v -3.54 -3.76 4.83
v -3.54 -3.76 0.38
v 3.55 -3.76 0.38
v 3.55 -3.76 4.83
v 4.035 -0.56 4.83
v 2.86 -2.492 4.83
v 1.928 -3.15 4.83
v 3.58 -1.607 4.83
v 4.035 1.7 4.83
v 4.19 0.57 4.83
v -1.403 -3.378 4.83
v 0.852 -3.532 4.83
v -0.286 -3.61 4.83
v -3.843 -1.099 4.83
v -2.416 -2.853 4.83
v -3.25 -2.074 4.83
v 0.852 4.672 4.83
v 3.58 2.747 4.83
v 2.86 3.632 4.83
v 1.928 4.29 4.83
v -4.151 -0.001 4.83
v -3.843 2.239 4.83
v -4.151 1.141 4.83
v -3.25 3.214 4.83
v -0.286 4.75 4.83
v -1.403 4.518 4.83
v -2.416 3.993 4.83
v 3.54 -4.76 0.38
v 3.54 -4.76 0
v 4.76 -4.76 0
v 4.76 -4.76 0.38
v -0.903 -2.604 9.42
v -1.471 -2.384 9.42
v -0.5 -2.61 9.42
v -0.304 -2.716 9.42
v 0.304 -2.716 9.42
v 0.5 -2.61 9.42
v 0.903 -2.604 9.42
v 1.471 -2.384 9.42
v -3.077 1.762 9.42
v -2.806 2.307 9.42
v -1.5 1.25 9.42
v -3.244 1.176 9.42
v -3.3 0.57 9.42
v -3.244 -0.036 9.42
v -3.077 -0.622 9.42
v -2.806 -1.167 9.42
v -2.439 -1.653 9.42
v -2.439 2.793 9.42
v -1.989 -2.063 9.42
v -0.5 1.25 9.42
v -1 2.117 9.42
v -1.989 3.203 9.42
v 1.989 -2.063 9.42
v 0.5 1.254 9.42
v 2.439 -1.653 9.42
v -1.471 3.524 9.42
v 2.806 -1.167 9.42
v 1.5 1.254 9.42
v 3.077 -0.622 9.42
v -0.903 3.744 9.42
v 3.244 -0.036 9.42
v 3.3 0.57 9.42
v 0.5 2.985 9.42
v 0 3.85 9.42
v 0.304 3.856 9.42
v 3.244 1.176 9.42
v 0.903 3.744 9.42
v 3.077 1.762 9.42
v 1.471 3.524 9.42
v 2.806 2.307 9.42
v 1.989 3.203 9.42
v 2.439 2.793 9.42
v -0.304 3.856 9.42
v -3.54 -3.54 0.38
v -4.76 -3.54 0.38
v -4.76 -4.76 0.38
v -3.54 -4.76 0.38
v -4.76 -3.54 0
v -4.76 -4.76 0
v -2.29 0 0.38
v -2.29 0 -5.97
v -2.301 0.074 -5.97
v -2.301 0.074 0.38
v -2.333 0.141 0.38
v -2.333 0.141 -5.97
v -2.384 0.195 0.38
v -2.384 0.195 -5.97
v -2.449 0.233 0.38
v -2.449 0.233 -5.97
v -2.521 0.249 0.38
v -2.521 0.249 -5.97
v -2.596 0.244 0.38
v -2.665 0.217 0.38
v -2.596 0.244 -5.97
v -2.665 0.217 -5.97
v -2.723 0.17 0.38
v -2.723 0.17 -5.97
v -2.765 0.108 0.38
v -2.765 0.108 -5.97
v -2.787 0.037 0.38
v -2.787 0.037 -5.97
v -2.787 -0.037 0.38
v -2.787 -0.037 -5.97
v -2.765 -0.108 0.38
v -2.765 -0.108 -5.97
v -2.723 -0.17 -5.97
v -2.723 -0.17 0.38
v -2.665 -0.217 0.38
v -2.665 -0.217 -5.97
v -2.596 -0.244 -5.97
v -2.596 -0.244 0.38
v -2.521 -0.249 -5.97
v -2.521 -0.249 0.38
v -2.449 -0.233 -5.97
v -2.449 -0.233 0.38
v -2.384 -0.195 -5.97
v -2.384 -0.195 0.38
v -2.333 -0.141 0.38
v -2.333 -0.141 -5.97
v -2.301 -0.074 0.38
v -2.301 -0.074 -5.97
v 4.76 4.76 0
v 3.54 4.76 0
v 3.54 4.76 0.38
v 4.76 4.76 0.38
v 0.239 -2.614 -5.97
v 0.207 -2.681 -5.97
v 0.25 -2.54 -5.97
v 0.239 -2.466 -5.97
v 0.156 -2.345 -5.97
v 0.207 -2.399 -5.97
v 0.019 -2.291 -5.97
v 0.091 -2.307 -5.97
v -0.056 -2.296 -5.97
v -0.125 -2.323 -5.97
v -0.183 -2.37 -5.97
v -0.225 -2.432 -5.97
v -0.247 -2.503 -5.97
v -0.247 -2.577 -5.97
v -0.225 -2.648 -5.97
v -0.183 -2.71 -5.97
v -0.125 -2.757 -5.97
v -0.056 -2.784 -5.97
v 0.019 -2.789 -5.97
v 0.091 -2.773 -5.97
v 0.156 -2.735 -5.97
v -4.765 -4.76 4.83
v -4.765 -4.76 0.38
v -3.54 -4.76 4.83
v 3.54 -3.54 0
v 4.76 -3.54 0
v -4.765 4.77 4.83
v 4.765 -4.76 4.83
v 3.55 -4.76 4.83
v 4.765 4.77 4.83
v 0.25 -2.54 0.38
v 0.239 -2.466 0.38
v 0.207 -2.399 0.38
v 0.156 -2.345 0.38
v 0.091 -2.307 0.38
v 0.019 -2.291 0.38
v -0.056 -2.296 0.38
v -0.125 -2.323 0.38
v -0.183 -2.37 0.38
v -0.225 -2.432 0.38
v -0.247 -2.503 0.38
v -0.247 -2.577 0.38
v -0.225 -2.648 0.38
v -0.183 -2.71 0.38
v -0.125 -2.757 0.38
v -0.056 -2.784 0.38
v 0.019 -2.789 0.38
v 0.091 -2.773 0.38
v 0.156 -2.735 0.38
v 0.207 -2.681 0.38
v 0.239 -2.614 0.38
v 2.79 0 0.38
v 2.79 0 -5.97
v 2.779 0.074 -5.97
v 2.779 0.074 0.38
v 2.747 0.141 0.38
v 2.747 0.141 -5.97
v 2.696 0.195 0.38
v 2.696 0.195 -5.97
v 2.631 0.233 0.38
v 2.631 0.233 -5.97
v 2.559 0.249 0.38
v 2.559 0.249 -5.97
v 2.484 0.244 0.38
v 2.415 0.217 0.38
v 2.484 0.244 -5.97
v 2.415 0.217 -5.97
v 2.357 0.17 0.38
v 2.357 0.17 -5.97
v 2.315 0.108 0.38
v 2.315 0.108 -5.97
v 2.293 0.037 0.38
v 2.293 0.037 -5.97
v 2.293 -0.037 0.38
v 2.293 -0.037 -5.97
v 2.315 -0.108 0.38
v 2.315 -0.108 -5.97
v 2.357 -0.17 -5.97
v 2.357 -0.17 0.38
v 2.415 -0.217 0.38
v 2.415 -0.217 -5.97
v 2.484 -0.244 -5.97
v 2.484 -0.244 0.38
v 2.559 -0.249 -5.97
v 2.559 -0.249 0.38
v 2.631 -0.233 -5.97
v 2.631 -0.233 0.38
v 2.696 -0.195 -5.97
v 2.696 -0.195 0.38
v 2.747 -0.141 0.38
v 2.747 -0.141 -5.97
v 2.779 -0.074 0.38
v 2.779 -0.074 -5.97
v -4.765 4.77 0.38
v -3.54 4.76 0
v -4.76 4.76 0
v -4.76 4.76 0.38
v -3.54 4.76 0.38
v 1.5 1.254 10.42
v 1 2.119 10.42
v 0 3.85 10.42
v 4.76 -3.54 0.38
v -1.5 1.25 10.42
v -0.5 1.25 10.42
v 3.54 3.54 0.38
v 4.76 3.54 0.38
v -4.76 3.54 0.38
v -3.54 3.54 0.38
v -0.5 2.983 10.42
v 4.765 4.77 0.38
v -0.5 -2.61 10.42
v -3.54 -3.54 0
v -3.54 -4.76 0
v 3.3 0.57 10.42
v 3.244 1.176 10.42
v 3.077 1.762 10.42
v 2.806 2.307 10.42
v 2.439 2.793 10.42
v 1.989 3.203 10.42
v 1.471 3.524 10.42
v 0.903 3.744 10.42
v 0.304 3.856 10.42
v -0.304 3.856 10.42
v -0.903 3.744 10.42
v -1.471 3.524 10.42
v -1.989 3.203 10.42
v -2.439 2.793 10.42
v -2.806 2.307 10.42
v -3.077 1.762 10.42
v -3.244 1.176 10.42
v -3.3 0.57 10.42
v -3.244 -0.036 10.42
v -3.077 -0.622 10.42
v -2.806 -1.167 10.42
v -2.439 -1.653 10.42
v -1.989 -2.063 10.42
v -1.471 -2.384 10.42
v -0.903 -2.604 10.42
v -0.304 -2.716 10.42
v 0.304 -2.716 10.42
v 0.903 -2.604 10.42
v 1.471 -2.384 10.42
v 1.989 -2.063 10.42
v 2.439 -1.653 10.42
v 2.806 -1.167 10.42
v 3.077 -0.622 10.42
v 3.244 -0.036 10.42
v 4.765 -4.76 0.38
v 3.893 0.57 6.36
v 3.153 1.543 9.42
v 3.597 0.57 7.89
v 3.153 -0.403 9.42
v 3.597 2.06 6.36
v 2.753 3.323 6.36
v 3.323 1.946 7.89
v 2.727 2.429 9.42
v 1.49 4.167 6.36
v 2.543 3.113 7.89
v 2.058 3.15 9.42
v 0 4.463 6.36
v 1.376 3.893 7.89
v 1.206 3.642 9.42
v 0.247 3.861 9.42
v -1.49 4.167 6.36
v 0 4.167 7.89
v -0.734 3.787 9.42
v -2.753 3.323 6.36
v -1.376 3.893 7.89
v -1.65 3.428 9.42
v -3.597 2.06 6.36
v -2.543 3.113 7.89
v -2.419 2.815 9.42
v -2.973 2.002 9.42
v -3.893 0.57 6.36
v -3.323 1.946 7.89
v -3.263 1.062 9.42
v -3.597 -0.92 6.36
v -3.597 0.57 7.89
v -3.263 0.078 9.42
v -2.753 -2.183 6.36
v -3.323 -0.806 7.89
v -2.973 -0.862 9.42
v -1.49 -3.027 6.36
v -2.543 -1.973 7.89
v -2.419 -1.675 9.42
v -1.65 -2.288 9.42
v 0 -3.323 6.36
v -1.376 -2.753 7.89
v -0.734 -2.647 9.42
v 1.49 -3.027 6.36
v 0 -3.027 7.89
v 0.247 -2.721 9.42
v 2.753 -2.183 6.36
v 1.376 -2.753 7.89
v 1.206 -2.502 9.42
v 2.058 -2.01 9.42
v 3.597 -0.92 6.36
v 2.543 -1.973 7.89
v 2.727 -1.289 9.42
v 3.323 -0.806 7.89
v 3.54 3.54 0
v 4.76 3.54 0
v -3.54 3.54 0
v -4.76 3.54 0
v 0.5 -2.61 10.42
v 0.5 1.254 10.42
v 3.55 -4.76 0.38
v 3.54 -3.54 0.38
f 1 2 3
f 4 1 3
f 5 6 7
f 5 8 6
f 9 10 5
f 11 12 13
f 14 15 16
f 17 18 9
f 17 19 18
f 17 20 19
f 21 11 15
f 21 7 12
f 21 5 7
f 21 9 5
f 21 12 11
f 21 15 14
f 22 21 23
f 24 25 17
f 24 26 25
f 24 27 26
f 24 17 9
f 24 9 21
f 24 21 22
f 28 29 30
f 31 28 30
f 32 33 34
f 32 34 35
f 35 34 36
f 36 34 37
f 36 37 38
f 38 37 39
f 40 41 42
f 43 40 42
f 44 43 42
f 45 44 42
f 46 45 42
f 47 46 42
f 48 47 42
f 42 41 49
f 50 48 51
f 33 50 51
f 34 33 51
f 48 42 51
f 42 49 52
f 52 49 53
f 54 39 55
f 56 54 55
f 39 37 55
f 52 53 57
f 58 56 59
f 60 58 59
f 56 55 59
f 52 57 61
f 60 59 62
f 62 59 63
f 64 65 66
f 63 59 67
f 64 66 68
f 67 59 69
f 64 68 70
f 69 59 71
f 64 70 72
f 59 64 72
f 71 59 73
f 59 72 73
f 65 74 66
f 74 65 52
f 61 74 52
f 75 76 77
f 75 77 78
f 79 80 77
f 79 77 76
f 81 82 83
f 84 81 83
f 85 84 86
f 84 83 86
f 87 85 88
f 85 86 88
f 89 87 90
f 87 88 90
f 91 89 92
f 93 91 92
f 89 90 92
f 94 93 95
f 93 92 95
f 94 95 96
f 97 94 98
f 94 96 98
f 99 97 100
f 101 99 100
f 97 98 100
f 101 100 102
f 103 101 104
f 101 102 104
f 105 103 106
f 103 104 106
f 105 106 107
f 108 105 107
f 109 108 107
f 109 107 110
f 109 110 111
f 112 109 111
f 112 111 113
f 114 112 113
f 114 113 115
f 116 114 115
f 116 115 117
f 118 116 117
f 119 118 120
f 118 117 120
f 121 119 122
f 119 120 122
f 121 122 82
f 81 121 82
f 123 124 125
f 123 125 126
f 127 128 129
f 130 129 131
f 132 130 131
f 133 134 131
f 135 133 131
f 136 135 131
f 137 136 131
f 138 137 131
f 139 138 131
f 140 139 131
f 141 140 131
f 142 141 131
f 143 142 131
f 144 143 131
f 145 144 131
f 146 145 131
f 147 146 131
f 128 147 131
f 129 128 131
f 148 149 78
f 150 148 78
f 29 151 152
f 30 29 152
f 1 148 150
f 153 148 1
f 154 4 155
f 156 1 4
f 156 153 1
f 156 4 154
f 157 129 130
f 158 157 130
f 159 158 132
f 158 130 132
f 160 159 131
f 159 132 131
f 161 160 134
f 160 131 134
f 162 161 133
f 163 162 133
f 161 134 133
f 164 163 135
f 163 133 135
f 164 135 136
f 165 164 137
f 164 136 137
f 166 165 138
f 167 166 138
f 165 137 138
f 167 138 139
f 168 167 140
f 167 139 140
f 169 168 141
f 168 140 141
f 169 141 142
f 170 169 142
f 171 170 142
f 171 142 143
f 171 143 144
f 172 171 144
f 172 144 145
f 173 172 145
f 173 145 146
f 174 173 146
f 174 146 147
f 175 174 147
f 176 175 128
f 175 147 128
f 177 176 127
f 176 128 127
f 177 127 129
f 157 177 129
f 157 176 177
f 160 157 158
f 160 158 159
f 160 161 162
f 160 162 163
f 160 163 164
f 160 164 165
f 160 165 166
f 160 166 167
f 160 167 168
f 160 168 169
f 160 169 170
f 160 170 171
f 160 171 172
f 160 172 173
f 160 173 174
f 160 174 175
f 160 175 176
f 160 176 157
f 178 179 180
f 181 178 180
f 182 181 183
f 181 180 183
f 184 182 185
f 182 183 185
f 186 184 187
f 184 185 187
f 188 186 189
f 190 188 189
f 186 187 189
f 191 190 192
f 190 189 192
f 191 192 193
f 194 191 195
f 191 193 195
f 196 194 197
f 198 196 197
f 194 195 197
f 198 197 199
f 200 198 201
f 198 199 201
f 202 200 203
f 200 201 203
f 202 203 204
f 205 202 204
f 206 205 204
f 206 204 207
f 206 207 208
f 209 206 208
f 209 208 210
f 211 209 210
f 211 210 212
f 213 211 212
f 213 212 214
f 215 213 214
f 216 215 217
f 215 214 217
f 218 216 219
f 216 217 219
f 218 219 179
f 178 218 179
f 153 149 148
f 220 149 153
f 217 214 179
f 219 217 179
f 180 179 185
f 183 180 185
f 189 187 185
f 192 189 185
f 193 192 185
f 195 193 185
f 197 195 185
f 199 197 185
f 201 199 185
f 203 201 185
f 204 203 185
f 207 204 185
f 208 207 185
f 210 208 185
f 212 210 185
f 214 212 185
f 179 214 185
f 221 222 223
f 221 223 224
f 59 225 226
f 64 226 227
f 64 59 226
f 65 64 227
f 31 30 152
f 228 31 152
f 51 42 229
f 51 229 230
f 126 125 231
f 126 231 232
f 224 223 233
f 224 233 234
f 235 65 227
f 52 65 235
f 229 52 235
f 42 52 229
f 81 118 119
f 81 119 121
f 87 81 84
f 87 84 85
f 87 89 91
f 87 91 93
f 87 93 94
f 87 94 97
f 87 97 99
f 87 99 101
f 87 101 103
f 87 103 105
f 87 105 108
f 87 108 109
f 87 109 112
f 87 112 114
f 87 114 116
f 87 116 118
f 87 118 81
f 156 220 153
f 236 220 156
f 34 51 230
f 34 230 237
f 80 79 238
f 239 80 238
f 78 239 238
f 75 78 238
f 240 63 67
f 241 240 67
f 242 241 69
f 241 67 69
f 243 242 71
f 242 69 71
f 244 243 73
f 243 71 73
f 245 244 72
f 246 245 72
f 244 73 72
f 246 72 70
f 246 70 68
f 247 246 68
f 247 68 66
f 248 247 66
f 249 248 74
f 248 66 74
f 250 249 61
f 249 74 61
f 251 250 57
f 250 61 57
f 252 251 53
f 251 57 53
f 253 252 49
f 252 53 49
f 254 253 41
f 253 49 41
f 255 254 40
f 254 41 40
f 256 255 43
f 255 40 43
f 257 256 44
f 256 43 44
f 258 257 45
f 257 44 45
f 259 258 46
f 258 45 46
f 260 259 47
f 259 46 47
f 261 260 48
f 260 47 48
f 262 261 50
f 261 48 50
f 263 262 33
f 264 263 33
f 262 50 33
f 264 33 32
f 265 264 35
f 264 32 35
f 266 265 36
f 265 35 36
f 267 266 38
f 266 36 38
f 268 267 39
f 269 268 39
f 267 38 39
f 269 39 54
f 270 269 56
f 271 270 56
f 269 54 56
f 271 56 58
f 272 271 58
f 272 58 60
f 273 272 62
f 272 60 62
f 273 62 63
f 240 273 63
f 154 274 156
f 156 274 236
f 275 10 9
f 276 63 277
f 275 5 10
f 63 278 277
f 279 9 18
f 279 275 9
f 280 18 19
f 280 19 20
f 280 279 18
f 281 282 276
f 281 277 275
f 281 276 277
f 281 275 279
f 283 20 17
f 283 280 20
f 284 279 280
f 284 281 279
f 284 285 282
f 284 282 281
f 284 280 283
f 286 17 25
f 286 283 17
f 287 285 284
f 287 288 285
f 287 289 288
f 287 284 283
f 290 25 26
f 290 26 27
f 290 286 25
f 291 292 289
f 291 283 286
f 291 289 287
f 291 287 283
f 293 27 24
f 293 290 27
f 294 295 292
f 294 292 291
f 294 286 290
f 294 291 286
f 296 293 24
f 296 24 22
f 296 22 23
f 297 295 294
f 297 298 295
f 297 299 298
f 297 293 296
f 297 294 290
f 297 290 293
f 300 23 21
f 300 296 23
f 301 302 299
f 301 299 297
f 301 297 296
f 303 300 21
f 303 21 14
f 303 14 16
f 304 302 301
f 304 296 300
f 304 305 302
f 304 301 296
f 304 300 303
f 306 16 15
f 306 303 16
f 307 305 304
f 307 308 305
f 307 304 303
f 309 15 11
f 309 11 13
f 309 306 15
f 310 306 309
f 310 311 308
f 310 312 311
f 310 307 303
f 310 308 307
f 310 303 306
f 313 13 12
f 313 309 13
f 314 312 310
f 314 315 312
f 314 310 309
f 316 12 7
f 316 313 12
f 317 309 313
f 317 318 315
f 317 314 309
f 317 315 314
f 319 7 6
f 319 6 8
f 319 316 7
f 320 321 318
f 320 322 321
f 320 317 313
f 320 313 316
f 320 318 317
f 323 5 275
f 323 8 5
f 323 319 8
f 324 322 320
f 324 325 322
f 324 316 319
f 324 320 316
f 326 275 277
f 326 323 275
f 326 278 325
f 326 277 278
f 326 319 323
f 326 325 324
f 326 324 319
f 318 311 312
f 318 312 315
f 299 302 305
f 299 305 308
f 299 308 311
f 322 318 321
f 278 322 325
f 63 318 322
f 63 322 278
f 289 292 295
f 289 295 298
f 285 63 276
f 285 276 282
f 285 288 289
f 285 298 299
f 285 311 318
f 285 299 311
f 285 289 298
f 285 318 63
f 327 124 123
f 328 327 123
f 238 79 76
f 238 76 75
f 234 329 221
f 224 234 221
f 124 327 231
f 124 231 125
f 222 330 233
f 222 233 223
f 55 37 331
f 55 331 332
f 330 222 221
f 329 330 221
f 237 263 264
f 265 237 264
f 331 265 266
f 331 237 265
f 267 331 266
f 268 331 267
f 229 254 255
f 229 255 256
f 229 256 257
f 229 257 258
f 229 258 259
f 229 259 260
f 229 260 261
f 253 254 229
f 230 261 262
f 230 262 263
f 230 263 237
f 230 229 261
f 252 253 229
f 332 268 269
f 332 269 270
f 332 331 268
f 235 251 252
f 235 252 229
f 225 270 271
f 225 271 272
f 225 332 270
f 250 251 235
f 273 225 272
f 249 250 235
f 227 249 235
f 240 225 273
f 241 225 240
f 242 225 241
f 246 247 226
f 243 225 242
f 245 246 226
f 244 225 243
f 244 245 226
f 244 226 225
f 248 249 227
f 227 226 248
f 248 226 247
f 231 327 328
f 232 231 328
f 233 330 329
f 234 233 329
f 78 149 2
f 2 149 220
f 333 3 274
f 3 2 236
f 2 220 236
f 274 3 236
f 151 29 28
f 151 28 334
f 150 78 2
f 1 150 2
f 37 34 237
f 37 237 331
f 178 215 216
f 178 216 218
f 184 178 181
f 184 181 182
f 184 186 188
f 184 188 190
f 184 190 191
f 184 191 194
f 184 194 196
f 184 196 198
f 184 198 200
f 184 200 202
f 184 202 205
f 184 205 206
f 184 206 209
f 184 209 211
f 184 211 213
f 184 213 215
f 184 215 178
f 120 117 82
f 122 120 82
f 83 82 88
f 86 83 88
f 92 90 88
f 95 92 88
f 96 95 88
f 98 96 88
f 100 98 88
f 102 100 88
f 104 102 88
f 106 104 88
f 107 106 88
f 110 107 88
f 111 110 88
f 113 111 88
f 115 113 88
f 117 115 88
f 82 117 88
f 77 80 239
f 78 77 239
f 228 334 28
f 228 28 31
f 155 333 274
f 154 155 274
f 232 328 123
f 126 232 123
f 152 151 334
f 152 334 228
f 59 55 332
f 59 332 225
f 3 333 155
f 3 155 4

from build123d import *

# Parameters (mm, degrees)
BOX001_W          = 1.22
BOX001_H          = 1.22
BOX001_DEPTH      = 0.38
BOX002_W          = 1.22
BOX002_H          = 1.22
BOX002_DEPTH      = 0.38
BOX003_W          = 1.22
BOX003_H          = 1.22
BOX003_DEPTH      = 0.38
BOX004_W          = 1.22
BOX004_H          = 1.22
BOX004_DEPTH      = 0.38
BOX005_W          = 7.09
BOX005_H          = 1
BOX005_DEPTH      = 4.45
BOX_W             = 9.53
BOX_H             = 9.53
BOX_DEPTH         = 4.45
CYLINDER_R        = 0.25
CYLINDER_DEPTH    = 6.35
CYLINDER001_R     = 0.25
CYLINDER001_DEPTH = 6.35
CYLINDER002_R     = 0.25
CYLINDER002_DEPTH = 6.35
PAD_DEPTH         = 1.4
CYLINDER003_R     = 3.3
CYLINDER003_DEPTH = 1


with BuildPart() as cube001:
    # Box001 → Box001 (new body)
    with BuildSketch(Plane(origin=(-4.76, -4.76, 0), x_dir=(1, 0, 0), z_dir=(0, 0, 1))):
        with Locations((0.61, 0.61)):
            Rectangle(BOX001_W, BOX001_H)
    extrude(amount=BOX001_DEPTH)


with BuildPart() as cube002:
    # Box002 → Box002 (new body)
    with BuildSketch(Plane(origin=(-4.76, 3.54, 0), x_dir=(1, 0, 0), z_dir=(0, 0, 1))):
        with Locations((0.61, 0.61)):
            Rectangle(BOX002_W, BOX002_H)
    extrude(amount=BOX002_DEPTH)


with BuildPart() as cube003:
    # Box003 → Box003 (new body)
    with BuildSketch(Plane(origin=(3.54, -4.76, 0), x_dir=(1, 0, 0), z_dir=(0, 0, 1))):
        with Locations((0.61, 0.61)):
            Rectangle(BOX003_W, BOX003_H)
    extrude(amount=BOX003_DEPTH)


with BuildPart() as cube004:
    # Box004 → Box004 (new body)
    with BuildSketch(Plane(origin=(3.54, 3.54, 0), x_dir=(1, 0, 0), z_dir=(0, 0, 1))):
        with Locations((0.61, 0.61)):
            Rectangle(BOX004_W, BOX004_H)
    extrude(amount=BOX004_DEPTH)


with BuildPart() as cube005:
    # Box005 → Box005 (new body)
    with BuildSketch(Plane(origin=(-3.54, -4.76, 0.38), x_dir=(1, 0, 0), z_dir=(0, 0, 1))):
        with Locations((3.545, 0.5)):
            Rectangle(BOX005_W, BOX005_H)
    extrude(amount=BOX005_DEPTH)


with BuildPart() as cut:
    # Box → Box (new body)
    with BuildSketch(Plane(origin=(-4.765, -4.76, 0.38), x_dir=(1, 0, 0), z_dir=(0, 0, 1))):
        with Locations((4.765, 4.765)):
            Rectangle(BOX_W, BOX_H)
    extrude(amount=BOX_DEPTH)

    # Cut: cut Cube005
    add(cube005.part, mode=Mode.SUBTRACT)


with BuildPart() as cylinder:
    # Cylinder → Cylinder (new body)
    with BuildSketch(Plane(origin=(2.54, 0, -5.97), x_dir=(1, 0, 0), z_dir=(0, 0, 1))):
        Circle(CYLINDER_R)
    extrude(amount=CYLINDER_DEPTH)


with BuildPart() as cylinder001:
    # Cylinder001 → Cylinder001 (new body)
    with BuildSketch(Plane(origin=(-2.54, 0, -5.97), x_dir=(1, 0, 0), z_dir=(0, 0, 1))):
        Circle(CYLINDER001_R)
    extrude(amount=CYLINDER001_DEPTH)


with BuildPart() as cylinder002:
    # Cylinder002 → Cylinder002 (new body)
    with BuildSketch(Plane(origin=(0, -2.54, -5.97), x_dir=(1, 0, 0), z_dir=(0, 0, 1))):
        Circle(CYLINDER002_R)
    extrude(amount=CYLINDER002_DEPTH)


with BuildPart() as cone:
    # Cone → Cone (revolve)
    with BuildSketch(Plane(origin=(0, 0.57, 4.83), x_dir=(1, 0, 0), z_dir=(0, -1, 0))):
        Polygon((0, 0), (4.19, 0), (3.3, 4.59), (0, 4.59), align=None)
    revolve(axis=Axis((0, 0.57, 4.83), (0, 0, 1)))


with BuildPart() as body:
    # Sketch → Pad (new body)
    with BuildSketch(Plane.XY):
        Polygon((-0.5, -2.61), (0.5, -2.61), (0.5, 1.253845), (1.5, 1.253845), (0, 3.85), (-1.5, 1.25), (-0.5, 1.25), align=None)
    extrude(amount=PAD_DEPTH)


with BuildPart() as body_1:
    # Body placement: moved
    add(body.part.moved(Location((0, 0, 9.02))))


with BuildPart() as cut001:
    # Cylinder003 → Cylinder003 (new body)
    with BuildSketch(Plane(origin=(0, 0.57, 9.42), x_dir=(1, 0, 0), z_dir=(0, 0, 1))):
        Circle(CYLINDER003_R)
    extrude(amount=CYLINDER003_DEPTH)

    # Cut001: cut Body
    add(body_1.part, mode=Mode.SUBTRACT)


solid = Compound([cube001.part, cube002.part, cube003.part, cube004.part, cut.part, cylinder.part, cylinder001.part, cylinder002.part, cone.part, cut001.part])
